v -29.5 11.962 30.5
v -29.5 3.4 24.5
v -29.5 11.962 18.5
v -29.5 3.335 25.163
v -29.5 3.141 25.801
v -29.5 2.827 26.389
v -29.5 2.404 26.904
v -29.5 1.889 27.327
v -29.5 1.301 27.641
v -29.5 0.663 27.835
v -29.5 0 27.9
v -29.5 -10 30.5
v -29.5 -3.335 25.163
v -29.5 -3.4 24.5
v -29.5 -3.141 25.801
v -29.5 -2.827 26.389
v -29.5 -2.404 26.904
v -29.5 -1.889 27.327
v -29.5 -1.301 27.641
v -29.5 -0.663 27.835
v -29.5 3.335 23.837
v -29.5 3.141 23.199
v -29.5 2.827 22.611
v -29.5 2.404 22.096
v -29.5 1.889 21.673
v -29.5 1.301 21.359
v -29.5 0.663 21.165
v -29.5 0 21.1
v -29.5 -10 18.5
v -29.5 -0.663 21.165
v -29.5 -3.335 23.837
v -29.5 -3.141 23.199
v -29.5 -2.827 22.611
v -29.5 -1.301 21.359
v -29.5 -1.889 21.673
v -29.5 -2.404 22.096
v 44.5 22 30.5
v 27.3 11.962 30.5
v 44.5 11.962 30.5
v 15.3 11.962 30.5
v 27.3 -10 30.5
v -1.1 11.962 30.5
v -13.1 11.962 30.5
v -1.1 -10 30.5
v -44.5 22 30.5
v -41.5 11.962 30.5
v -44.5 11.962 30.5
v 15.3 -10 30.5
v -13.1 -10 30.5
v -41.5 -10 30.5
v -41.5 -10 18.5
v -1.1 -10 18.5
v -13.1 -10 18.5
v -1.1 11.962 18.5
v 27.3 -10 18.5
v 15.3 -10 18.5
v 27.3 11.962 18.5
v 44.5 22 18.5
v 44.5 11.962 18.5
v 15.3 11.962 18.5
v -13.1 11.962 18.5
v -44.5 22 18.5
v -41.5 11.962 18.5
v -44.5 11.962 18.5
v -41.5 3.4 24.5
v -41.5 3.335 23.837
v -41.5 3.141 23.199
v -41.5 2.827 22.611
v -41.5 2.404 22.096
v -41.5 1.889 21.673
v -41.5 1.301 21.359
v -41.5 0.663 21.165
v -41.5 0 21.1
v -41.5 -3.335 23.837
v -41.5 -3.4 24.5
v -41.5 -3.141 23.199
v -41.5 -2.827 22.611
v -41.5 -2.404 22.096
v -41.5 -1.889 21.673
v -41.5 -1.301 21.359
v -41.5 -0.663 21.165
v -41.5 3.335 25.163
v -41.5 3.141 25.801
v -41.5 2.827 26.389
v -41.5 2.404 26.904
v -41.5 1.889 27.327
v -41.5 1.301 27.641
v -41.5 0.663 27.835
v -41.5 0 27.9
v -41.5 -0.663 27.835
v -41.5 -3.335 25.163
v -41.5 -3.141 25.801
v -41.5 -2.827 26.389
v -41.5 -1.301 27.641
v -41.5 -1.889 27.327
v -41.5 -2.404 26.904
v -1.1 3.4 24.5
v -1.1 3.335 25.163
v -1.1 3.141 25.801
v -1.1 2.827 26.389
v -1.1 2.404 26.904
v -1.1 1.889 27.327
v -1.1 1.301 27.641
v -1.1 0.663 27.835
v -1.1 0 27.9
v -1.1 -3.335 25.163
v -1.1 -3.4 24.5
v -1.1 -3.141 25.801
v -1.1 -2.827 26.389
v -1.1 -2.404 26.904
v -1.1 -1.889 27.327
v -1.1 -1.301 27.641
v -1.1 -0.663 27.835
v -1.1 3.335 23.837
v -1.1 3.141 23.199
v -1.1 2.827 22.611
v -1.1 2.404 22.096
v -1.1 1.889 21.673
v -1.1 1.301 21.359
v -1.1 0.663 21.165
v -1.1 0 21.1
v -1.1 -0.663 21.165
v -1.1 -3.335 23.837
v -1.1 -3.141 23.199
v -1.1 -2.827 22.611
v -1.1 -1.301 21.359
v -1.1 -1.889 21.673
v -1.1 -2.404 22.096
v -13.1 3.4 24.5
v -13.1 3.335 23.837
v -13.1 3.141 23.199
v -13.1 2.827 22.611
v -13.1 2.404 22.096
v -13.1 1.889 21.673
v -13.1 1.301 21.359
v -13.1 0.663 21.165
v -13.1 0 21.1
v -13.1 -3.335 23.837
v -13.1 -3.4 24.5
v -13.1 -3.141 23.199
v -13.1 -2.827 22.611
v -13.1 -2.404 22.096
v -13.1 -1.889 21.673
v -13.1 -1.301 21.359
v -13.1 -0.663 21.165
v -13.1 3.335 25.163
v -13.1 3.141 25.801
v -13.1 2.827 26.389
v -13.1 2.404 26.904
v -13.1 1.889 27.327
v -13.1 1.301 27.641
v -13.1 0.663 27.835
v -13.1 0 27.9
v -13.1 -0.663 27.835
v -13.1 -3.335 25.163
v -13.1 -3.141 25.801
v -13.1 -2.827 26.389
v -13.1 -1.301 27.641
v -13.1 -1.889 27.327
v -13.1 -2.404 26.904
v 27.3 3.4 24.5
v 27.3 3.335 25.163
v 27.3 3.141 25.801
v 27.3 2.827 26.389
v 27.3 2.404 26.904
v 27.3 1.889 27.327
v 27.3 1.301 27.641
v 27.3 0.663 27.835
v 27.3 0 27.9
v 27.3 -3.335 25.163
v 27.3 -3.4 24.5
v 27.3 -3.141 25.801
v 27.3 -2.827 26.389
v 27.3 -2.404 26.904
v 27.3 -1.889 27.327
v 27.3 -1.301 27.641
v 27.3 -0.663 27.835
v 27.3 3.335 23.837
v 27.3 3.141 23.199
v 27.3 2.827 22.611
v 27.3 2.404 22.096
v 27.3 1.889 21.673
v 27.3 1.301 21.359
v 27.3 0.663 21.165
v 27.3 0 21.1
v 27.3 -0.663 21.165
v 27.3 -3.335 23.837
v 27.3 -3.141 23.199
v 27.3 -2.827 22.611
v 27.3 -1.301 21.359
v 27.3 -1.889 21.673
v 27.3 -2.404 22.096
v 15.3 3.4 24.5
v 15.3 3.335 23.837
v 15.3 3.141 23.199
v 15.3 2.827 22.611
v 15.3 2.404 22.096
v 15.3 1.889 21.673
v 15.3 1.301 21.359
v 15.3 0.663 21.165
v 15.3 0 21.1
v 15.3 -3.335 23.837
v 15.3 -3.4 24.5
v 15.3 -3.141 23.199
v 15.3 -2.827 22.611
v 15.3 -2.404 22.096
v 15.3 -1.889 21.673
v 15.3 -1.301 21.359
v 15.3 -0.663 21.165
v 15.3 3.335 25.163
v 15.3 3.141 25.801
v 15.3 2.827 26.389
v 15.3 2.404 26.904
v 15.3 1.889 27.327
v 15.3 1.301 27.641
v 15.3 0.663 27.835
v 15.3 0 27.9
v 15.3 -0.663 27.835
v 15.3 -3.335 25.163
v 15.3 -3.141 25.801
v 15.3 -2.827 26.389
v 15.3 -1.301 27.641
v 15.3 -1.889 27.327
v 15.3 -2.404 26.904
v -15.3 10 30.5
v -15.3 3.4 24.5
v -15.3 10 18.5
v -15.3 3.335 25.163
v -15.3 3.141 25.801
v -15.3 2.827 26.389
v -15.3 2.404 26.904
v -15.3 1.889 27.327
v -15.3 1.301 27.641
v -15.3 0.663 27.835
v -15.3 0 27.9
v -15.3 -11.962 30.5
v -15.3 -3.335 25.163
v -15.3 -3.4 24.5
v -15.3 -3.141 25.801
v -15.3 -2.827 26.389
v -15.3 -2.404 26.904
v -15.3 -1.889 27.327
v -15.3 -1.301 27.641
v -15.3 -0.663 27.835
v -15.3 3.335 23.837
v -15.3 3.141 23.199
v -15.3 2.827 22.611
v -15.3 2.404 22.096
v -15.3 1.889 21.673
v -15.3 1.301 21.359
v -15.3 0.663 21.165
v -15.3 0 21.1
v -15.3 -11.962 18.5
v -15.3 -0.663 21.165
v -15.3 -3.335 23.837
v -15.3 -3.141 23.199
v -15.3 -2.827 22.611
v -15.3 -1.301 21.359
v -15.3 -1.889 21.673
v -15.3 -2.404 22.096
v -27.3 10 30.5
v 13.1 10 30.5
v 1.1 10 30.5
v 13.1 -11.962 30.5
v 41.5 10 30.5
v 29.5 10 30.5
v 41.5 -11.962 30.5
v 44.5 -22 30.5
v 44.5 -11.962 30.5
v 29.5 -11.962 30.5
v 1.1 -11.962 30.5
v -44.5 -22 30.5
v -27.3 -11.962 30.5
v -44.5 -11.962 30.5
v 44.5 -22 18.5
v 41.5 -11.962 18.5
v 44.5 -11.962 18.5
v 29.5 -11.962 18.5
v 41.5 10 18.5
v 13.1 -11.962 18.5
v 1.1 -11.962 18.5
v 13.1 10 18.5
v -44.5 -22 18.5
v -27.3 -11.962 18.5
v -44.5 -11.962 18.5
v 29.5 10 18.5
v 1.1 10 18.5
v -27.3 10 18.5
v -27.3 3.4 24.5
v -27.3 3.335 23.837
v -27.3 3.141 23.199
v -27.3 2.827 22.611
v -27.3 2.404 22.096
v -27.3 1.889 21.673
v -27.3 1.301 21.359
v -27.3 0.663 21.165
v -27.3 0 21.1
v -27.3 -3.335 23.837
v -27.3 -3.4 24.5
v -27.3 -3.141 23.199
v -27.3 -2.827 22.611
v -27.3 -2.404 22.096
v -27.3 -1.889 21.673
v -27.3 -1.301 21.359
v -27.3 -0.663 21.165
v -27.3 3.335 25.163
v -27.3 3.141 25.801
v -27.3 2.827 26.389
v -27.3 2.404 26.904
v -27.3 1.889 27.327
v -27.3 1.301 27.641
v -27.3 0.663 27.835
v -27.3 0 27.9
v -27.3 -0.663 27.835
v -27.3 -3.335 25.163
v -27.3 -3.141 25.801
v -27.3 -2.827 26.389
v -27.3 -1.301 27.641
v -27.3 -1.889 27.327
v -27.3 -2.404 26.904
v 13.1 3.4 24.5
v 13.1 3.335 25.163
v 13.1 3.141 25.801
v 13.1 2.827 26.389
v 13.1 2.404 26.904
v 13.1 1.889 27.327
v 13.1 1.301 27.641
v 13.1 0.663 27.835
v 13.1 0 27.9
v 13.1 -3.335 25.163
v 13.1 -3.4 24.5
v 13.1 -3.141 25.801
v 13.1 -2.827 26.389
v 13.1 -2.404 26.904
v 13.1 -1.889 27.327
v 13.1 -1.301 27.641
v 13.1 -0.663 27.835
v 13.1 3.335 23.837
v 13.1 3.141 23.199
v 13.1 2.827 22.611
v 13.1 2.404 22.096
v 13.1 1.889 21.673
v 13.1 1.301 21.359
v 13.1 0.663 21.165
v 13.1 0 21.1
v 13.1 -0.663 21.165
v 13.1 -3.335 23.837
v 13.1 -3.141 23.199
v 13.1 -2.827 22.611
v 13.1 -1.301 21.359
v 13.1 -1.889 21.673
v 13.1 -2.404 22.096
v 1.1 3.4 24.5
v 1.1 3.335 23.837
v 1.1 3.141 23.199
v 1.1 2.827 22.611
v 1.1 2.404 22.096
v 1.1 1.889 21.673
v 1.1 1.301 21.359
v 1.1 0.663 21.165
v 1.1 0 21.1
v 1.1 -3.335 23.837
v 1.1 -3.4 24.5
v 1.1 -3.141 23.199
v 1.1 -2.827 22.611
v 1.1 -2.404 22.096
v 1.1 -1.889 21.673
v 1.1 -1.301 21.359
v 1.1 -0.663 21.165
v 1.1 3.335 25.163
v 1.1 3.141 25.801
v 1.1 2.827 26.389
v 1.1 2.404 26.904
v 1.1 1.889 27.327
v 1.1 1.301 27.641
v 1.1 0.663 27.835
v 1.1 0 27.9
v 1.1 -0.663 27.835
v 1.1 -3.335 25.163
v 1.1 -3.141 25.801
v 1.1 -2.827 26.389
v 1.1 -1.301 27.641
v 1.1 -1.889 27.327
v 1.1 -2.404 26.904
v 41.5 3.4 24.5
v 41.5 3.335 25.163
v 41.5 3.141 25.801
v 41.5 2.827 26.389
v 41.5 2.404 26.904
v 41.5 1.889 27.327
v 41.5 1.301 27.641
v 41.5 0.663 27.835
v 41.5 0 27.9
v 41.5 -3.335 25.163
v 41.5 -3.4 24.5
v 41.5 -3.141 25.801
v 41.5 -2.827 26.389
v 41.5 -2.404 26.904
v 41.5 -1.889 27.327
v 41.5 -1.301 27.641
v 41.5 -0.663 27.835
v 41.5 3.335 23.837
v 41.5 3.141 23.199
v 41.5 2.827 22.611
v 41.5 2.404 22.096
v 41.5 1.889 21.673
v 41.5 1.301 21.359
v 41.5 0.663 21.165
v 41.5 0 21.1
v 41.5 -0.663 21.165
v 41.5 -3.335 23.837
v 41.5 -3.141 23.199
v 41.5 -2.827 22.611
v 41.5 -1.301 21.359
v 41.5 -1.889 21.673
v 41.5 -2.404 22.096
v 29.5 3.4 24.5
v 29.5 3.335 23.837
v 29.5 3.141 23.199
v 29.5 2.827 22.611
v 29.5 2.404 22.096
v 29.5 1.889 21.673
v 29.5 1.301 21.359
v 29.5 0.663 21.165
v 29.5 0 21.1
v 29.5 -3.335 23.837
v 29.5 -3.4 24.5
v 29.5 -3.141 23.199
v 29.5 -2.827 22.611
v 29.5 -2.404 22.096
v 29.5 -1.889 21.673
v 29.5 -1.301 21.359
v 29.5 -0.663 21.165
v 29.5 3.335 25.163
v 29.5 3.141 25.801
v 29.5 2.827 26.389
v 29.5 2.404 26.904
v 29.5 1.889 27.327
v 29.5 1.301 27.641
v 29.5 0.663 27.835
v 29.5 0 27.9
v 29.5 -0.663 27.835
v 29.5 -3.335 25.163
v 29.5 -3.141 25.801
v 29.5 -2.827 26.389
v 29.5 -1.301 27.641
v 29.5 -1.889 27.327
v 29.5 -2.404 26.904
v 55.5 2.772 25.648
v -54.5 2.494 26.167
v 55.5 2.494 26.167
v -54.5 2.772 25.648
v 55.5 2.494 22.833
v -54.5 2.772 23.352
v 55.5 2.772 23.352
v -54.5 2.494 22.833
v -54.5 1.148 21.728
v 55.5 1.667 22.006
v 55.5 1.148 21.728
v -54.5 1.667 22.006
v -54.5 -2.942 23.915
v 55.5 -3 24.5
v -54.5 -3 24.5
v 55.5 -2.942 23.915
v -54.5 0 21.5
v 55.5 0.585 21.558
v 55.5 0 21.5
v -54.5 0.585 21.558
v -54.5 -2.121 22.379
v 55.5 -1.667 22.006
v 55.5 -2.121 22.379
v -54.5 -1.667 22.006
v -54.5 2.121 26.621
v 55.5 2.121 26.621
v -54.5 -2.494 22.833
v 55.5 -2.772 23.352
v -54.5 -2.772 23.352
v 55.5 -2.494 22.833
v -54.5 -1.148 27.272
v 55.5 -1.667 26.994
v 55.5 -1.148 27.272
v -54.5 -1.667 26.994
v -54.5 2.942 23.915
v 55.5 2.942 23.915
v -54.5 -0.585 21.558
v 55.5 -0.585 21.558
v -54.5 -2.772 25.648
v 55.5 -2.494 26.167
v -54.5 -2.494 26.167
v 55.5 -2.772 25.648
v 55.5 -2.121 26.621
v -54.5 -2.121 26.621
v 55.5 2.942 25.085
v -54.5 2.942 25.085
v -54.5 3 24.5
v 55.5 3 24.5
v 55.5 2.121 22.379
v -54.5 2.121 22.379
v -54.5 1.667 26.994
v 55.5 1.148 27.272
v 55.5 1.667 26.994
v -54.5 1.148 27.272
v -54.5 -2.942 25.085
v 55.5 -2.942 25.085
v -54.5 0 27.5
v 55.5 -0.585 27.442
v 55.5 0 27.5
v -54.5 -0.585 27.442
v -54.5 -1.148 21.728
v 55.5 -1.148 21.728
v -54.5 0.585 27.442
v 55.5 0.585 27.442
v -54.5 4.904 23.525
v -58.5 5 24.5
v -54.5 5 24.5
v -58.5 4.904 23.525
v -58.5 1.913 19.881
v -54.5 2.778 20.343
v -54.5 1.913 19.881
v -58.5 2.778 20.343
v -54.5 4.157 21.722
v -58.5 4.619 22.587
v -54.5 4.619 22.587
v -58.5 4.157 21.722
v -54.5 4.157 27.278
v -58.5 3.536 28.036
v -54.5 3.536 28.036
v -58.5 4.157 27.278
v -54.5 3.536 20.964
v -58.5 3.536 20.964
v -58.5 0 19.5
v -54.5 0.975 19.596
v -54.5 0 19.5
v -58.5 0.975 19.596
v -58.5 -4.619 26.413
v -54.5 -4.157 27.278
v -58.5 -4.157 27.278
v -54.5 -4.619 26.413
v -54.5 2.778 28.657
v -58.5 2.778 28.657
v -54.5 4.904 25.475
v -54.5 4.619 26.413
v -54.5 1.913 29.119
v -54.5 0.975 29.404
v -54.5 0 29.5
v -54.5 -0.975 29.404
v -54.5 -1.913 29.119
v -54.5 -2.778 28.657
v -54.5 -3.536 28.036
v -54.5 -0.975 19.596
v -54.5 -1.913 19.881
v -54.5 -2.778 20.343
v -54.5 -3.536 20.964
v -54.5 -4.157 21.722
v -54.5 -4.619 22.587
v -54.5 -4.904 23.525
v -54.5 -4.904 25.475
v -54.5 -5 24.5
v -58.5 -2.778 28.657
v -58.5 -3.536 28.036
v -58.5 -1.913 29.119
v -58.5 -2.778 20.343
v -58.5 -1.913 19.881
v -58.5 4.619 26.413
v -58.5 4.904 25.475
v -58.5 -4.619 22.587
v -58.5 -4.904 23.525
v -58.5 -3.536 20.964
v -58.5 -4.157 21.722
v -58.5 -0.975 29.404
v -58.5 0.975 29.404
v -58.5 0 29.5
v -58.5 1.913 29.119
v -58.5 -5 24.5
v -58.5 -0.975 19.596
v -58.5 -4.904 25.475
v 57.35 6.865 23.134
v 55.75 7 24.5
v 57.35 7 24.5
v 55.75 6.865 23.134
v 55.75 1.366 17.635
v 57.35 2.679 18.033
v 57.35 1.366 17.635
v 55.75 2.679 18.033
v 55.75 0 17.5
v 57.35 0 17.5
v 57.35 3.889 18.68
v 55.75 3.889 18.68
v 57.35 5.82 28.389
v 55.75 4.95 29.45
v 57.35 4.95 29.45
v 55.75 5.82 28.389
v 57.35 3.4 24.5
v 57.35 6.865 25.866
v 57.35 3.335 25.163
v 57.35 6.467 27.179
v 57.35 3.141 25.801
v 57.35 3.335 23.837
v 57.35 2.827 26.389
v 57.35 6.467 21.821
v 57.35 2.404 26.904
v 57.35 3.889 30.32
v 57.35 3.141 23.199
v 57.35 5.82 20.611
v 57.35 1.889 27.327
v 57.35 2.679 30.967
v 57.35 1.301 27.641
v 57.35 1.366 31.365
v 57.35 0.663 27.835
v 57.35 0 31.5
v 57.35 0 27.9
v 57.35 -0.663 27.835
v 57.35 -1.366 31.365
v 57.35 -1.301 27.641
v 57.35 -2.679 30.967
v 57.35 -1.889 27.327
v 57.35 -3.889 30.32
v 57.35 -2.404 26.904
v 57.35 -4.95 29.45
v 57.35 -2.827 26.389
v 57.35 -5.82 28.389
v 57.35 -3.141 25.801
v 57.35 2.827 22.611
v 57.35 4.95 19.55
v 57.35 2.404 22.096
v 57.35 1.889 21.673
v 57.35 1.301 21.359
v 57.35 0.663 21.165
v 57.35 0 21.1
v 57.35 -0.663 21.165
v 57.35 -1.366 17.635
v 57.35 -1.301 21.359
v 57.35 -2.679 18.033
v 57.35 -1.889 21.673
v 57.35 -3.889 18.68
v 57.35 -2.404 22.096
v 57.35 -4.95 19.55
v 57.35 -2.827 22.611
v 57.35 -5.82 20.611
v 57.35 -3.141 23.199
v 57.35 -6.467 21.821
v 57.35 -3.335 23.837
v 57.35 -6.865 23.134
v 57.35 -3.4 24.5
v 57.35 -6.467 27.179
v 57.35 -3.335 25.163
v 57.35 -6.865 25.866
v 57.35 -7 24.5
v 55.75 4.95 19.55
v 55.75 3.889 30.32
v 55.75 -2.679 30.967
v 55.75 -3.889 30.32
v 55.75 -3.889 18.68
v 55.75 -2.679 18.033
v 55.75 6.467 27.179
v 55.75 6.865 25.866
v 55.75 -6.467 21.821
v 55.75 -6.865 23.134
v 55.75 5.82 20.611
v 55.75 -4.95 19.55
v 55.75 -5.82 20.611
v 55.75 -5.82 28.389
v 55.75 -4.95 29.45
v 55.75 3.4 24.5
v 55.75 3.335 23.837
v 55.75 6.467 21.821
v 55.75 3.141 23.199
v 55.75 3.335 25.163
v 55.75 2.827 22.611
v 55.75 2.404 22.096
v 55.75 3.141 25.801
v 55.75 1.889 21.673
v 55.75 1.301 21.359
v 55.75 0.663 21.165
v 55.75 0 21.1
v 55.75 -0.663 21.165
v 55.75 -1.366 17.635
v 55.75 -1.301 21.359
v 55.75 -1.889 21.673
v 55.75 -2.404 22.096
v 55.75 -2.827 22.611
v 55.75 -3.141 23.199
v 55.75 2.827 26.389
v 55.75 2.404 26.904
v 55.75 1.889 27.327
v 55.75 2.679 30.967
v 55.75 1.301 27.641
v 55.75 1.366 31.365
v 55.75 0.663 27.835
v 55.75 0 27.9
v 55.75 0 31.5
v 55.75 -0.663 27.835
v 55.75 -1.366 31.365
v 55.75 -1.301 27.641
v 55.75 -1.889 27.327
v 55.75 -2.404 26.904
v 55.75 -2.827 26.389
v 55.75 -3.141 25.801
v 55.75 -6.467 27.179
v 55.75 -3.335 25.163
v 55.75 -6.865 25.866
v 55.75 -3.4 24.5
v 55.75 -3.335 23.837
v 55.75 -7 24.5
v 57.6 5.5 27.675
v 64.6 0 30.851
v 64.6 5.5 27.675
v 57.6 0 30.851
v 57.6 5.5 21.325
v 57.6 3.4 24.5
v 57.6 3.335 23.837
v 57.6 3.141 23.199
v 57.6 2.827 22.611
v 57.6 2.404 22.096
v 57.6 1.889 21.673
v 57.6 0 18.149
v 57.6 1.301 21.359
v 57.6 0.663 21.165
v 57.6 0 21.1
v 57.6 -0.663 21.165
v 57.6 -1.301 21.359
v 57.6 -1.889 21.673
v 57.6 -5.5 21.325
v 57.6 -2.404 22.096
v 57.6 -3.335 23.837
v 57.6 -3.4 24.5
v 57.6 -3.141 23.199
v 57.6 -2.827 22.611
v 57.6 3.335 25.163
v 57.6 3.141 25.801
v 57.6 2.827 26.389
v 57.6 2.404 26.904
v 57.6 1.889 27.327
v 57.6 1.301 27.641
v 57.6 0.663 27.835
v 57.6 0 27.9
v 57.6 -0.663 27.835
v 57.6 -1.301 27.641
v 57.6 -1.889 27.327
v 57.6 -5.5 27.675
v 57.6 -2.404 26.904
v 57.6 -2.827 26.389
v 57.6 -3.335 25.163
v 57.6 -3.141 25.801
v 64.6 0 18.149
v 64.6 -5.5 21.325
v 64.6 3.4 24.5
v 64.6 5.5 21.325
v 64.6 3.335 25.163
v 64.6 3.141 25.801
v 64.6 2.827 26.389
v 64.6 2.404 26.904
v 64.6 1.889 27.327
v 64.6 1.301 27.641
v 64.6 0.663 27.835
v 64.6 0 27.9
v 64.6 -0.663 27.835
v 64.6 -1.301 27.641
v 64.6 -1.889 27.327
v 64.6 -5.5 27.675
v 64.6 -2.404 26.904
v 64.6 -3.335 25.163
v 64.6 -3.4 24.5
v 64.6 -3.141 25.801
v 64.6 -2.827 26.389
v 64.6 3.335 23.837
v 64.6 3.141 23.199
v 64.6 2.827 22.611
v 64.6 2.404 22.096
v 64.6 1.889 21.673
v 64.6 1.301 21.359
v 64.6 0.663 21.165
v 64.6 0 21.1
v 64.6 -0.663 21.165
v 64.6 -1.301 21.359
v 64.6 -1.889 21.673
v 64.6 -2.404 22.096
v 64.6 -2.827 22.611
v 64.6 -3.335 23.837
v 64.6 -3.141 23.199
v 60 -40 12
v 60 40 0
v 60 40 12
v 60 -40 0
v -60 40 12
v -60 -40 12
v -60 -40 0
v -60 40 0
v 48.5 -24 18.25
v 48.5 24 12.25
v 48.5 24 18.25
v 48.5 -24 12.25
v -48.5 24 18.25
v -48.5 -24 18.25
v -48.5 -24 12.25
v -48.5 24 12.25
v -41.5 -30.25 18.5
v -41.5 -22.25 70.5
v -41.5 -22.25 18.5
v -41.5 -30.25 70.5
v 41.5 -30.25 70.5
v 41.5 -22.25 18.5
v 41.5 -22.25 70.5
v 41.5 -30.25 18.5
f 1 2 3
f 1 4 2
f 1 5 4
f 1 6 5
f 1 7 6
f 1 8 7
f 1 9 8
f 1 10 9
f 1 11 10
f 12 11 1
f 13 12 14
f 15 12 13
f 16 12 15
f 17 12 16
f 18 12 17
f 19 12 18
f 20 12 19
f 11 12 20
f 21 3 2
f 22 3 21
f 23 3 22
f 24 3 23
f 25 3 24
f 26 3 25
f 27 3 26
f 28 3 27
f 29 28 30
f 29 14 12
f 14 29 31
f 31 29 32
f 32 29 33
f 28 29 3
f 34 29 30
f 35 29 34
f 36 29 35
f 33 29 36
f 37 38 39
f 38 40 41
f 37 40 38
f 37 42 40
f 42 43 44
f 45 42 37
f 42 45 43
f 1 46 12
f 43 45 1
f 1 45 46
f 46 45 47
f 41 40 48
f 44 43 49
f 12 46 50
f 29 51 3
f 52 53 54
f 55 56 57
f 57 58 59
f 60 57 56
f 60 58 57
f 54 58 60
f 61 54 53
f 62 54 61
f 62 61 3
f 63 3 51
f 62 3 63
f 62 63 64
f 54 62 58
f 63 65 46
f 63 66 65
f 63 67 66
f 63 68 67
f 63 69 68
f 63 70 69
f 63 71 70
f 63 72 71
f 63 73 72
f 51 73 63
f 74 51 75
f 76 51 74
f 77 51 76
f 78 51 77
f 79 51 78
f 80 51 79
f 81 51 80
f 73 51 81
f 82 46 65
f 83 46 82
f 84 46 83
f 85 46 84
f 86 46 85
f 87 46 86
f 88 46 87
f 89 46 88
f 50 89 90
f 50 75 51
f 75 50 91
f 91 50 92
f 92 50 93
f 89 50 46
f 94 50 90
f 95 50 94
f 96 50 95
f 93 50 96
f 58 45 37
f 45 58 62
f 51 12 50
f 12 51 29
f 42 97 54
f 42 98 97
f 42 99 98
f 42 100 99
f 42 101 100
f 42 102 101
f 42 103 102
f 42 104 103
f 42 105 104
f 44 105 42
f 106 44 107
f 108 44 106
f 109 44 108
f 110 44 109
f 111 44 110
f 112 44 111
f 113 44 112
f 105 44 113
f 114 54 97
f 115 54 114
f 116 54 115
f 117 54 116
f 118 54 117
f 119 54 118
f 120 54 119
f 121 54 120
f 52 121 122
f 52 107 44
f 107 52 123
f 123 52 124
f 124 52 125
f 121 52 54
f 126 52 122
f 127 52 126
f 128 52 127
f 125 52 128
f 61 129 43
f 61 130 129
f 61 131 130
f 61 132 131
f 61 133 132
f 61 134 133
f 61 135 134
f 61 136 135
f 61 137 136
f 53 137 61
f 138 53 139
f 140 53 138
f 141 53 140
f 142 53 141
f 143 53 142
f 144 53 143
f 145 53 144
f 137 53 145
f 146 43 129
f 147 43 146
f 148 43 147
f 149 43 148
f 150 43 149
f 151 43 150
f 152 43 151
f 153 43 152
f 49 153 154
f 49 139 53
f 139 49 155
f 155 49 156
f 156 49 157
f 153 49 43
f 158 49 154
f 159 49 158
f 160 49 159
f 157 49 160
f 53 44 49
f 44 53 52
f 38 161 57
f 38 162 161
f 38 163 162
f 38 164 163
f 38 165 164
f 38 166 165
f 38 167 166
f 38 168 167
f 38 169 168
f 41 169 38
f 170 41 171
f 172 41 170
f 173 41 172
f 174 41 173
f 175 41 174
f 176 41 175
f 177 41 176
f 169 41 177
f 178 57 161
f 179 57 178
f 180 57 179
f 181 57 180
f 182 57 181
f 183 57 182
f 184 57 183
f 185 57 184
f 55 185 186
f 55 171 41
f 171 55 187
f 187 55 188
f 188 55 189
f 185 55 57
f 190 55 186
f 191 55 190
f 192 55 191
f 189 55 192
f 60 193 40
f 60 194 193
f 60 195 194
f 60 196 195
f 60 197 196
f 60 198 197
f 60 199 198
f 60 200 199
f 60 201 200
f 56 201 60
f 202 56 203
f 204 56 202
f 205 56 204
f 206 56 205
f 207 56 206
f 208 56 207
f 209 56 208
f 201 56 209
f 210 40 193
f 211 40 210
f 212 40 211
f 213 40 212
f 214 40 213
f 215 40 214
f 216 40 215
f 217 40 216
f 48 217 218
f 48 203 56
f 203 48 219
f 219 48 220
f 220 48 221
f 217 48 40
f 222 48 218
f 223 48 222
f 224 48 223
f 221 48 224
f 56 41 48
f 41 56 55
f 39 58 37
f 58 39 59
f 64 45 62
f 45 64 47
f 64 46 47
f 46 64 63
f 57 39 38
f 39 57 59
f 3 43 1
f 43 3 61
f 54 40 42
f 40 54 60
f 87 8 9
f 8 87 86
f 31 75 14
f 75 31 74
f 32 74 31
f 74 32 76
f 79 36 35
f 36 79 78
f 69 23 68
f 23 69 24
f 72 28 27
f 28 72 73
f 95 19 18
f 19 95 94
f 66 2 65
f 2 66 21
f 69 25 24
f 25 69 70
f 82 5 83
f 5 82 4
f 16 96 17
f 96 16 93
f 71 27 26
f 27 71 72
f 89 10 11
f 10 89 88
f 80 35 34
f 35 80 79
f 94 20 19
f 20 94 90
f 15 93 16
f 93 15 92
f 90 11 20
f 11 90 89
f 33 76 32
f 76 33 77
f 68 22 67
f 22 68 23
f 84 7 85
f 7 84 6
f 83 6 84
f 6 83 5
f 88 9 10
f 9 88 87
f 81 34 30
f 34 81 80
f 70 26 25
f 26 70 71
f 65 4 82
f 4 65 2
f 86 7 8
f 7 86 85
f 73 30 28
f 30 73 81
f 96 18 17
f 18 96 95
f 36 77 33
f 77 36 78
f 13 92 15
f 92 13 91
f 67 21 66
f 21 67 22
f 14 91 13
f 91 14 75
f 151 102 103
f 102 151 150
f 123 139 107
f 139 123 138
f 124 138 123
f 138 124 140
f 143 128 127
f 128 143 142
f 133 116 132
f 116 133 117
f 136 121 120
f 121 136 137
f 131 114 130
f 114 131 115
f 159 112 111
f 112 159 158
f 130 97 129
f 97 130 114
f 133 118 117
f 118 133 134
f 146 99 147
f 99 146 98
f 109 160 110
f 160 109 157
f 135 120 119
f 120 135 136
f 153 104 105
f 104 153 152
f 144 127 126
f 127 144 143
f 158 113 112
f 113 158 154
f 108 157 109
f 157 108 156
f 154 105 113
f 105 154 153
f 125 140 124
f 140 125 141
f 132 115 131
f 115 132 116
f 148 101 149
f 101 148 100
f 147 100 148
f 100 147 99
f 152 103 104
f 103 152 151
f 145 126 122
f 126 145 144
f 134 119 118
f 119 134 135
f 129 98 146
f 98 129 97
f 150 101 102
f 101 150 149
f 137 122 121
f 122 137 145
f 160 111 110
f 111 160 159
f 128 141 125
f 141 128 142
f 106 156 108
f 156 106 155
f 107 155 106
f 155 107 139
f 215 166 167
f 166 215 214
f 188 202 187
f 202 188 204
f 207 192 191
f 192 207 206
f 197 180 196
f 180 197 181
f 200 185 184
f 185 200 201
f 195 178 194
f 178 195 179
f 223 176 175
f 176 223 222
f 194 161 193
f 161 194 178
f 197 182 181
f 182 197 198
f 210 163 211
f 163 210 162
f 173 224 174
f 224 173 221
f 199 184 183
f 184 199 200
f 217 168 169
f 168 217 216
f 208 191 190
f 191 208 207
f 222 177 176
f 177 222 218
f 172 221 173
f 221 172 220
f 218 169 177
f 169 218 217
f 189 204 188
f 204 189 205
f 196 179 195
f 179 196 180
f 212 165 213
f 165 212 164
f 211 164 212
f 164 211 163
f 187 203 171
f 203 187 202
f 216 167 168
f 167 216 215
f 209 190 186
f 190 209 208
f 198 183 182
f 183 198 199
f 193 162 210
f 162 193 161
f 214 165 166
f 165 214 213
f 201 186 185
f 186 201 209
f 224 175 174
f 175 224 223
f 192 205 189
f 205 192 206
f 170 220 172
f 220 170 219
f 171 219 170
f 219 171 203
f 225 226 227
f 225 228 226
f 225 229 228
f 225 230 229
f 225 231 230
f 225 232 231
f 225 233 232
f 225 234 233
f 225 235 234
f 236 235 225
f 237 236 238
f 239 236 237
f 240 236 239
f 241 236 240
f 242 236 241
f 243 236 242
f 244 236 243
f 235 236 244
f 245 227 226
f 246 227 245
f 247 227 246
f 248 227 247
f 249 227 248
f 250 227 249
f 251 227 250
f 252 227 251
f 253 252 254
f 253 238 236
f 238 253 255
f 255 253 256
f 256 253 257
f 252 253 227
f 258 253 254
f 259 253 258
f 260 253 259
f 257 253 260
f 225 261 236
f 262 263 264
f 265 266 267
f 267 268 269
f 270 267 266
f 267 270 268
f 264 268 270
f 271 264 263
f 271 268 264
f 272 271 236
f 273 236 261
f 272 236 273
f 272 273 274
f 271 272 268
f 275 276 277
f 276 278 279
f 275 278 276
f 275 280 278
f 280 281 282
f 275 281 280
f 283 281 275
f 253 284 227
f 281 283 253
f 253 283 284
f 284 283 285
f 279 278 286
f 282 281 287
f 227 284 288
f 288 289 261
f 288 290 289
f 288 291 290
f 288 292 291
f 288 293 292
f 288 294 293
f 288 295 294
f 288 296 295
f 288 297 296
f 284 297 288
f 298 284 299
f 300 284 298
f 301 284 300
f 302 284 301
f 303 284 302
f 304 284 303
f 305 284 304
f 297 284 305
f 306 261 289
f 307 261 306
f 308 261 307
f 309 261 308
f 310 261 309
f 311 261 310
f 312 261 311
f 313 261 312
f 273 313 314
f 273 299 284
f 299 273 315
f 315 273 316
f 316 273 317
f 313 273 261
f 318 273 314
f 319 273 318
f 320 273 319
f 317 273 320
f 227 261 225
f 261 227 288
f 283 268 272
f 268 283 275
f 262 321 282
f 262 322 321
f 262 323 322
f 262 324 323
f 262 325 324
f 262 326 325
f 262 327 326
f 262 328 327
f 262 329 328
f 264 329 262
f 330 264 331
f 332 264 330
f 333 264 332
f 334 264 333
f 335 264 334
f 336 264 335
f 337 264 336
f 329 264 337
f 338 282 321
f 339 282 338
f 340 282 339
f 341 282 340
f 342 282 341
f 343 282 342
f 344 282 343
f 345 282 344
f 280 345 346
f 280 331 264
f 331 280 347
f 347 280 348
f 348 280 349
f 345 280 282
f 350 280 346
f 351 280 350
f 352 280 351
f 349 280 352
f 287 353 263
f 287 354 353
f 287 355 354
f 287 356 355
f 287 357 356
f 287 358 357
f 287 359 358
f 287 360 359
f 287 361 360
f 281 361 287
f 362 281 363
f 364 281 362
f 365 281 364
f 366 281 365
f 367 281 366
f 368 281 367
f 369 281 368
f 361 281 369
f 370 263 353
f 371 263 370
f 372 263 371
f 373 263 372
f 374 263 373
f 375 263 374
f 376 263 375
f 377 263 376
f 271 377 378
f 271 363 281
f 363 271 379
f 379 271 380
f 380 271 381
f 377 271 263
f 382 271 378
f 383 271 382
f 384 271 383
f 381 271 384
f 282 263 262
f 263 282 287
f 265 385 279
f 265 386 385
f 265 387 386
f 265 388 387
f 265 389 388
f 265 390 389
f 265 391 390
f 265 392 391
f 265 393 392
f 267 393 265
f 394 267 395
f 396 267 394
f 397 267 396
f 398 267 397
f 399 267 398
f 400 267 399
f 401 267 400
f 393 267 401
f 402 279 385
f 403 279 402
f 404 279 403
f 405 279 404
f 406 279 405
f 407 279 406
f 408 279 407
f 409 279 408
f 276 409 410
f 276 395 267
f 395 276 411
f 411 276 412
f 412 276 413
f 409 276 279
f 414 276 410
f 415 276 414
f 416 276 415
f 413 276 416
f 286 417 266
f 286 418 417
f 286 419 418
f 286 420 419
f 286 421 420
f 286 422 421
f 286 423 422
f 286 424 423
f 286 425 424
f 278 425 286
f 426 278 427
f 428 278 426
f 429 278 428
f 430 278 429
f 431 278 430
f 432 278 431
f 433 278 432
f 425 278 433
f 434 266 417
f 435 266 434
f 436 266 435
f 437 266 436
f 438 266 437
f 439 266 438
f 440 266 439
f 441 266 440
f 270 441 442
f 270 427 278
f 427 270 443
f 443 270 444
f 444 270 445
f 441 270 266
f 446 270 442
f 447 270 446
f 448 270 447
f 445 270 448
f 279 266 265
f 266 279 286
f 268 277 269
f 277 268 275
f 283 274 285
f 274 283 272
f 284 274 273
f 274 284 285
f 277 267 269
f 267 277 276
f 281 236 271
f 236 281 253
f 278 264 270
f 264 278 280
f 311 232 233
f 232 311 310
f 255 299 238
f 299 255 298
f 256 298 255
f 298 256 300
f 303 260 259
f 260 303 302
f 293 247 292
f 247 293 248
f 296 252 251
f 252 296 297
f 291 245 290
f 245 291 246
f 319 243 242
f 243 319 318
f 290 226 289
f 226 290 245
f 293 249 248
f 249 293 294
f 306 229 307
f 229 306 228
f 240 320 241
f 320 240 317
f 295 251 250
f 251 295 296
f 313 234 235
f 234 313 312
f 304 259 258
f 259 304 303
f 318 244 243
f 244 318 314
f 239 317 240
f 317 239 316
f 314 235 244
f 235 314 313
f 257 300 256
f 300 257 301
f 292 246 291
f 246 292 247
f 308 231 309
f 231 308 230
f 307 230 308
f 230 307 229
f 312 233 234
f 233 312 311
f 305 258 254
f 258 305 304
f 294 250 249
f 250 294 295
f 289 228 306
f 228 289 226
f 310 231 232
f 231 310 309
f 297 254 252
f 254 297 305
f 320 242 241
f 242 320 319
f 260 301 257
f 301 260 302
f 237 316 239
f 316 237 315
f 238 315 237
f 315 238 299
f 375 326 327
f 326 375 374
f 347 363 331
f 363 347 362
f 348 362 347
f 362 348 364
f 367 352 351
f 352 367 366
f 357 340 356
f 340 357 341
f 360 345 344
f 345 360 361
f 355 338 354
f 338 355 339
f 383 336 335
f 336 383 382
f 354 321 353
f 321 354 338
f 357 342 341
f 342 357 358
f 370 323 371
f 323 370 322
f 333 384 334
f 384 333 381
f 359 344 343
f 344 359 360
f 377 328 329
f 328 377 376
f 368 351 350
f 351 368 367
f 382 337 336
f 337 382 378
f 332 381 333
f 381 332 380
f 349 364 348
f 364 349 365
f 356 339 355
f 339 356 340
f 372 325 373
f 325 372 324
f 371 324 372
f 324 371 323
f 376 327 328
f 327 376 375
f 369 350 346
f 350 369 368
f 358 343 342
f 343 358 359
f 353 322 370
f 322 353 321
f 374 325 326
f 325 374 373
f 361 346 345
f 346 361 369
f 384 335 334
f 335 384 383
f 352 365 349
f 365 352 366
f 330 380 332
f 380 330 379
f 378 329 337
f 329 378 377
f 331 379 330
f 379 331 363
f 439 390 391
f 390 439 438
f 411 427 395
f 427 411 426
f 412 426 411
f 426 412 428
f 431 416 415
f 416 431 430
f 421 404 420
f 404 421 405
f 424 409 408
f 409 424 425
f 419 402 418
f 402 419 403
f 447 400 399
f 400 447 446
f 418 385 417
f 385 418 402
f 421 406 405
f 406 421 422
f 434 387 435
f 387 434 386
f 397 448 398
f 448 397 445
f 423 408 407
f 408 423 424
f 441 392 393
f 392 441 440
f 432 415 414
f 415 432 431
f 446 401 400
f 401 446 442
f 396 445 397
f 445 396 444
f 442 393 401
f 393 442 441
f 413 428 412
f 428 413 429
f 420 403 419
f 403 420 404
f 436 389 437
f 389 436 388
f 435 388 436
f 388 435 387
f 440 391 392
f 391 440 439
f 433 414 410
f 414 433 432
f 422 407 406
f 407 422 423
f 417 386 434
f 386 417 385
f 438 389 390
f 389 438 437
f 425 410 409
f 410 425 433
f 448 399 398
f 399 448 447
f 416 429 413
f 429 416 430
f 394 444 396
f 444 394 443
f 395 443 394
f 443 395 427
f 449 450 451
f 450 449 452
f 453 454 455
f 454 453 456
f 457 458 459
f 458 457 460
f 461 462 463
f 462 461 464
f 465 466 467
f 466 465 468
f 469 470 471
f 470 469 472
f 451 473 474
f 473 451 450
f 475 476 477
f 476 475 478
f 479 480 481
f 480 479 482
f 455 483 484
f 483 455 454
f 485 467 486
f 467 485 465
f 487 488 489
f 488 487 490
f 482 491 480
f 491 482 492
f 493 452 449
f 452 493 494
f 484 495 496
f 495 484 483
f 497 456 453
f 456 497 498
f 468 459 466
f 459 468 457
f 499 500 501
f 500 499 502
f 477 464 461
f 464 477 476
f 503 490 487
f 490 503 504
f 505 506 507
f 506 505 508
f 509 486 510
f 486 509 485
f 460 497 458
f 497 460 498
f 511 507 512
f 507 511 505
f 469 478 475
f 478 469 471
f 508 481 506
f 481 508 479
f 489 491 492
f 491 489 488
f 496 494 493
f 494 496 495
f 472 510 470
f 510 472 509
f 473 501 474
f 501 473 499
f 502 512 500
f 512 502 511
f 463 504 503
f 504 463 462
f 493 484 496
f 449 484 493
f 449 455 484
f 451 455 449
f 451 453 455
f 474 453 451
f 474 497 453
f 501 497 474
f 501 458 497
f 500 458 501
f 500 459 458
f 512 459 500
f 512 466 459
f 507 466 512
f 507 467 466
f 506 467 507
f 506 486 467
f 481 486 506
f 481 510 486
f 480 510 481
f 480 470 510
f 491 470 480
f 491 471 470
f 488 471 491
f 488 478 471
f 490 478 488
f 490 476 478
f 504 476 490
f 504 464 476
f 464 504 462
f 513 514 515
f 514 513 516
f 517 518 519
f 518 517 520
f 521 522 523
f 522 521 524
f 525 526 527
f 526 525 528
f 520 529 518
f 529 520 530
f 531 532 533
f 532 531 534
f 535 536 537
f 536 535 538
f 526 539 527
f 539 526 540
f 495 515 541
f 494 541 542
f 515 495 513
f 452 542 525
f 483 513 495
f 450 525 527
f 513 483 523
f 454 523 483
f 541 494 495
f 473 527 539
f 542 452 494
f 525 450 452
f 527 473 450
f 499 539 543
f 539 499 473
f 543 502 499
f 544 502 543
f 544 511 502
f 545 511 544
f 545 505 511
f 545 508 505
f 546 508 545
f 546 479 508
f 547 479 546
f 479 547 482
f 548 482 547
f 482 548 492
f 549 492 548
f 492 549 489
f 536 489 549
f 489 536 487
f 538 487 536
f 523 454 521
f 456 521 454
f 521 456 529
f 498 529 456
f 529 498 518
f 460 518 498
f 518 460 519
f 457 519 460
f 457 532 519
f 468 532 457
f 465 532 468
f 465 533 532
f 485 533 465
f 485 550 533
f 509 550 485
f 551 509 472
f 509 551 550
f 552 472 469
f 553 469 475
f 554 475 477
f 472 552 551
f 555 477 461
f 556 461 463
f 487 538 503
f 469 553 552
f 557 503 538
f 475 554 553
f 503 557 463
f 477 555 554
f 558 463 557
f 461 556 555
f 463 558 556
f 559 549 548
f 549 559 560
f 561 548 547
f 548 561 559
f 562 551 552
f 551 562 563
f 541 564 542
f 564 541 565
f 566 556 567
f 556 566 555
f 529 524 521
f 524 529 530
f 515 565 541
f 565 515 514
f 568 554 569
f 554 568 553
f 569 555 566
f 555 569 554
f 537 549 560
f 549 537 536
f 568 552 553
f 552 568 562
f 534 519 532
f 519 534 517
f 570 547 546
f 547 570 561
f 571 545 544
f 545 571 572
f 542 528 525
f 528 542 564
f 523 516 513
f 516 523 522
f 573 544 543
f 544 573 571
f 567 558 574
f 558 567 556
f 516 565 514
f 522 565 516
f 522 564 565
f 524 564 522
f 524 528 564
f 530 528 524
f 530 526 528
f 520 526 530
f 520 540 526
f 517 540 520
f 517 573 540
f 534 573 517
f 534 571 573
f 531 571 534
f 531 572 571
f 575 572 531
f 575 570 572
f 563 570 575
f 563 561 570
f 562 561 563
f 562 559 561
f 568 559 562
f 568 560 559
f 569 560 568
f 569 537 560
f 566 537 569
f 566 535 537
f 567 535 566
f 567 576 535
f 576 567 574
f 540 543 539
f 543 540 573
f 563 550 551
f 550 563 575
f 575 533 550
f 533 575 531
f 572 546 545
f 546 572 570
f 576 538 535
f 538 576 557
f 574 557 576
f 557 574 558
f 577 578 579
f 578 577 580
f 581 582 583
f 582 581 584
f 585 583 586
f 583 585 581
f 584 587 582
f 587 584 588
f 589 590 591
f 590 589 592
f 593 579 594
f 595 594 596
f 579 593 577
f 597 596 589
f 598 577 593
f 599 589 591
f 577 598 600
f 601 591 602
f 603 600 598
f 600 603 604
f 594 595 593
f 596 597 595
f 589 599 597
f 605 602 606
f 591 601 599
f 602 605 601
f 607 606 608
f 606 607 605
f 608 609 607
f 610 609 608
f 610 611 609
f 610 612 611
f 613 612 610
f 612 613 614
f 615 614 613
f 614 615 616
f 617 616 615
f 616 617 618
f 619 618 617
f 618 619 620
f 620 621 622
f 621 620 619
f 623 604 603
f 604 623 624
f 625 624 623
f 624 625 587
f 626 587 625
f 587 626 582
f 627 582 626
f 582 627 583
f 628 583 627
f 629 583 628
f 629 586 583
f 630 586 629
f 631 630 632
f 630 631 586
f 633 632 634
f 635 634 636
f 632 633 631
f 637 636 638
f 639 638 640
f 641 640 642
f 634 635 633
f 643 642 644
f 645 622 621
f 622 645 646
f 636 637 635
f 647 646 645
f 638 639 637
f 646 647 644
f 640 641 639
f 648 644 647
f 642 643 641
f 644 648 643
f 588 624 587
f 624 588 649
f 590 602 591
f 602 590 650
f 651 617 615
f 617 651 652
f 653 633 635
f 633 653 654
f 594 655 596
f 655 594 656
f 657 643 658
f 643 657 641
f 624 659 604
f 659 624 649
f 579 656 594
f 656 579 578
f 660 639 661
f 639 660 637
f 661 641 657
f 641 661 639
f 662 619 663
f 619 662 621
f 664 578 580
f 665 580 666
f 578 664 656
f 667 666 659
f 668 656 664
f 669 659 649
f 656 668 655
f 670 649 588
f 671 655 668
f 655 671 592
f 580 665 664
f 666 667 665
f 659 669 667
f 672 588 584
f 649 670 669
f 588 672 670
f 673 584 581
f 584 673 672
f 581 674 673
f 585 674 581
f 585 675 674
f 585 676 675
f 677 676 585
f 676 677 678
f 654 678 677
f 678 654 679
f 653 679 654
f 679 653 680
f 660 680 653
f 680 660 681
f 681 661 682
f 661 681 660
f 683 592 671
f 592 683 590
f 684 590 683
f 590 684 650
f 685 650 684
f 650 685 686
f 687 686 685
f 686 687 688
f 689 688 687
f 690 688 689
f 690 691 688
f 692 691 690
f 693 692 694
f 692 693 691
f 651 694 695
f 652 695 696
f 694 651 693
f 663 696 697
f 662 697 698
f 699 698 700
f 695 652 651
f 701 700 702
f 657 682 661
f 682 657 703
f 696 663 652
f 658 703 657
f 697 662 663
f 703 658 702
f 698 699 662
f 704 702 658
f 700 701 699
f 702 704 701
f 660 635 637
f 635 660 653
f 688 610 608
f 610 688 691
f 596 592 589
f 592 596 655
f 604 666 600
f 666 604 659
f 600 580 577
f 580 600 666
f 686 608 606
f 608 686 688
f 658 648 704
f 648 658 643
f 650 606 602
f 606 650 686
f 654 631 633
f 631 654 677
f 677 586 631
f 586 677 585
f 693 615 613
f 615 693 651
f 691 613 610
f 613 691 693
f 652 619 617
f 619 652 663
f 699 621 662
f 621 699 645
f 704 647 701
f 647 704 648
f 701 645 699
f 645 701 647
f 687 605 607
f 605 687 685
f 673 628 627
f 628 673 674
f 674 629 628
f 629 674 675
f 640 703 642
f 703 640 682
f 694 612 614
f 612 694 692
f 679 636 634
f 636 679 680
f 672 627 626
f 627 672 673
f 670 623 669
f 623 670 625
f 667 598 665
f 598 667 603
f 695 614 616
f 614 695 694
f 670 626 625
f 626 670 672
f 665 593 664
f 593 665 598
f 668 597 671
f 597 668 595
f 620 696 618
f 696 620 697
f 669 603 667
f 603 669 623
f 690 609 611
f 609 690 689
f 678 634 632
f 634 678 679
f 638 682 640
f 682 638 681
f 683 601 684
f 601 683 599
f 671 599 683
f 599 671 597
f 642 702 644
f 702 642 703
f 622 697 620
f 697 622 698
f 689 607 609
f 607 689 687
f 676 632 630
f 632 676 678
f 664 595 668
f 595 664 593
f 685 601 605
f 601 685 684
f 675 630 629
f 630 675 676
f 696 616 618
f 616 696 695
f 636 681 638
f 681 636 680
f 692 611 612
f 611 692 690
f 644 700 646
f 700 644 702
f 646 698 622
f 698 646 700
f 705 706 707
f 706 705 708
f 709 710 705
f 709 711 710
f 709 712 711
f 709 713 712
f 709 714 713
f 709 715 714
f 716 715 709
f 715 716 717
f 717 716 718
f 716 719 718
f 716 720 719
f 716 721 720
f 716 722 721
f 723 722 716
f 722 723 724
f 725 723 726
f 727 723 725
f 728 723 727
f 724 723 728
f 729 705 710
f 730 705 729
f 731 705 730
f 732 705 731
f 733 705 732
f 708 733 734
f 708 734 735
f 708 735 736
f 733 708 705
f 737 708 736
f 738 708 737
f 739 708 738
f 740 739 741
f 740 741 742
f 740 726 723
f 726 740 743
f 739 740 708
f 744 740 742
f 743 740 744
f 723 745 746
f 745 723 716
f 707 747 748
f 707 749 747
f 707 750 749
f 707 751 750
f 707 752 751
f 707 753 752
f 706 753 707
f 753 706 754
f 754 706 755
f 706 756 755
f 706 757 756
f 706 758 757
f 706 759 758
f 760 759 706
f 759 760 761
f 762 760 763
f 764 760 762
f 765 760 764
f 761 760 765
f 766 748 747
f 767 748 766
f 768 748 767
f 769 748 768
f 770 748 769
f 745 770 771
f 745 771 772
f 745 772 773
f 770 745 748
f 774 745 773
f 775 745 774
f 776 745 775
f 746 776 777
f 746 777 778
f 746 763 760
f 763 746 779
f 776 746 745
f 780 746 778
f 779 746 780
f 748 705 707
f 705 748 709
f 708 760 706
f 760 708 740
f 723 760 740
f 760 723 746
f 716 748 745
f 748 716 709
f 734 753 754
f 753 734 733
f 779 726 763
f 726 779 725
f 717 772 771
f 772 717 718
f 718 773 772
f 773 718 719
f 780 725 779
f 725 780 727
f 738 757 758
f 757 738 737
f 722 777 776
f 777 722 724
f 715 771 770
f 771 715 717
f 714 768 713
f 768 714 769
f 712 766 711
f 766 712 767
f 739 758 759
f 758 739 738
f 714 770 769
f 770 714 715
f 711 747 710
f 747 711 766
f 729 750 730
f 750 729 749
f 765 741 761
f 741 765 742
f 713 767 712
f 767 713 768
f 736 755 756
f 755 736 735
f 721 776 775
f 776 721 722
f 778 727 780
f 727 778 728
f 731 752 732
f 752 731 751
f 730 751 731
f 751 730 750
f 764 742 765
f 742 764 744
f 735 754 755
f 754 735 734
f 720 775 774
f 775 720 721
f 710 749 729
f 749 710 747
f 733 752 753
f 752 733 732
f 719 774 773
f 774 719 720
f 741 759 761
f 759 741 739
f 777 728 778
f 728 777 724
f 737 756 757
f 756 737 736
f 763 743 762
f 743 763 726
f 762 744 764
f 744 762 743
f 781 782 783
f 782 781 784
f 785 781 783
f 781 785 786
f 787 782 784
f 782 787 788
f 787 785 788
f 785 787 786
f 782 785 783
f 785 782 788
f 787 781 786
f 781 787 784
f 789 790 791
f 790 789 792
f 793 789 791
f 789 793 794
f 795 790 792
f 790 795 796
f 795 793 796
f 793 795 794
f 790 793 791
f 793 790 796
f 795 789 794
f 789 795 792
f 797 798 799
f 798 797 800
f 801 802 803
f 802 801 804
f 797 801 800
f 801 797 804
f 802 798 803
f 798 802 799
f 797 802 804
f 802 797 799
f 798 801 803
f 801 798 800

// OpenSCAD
$fn = 32;

// ------------------------------------------------------------------------
// Comb hinge with flap: leaf 89 x 22 mm, pin d6, flap 52 mm
// Every part is its own module, assembly() places every instance.
// ------------------------------------------------------------------------

// --- part 1 ---
module hinge_bed() {
  difference() {
    translate([-60, -40, 0]) cube([120, 80, 12]);
  }
}

// --- part 2 ---
module hinge_riser() {
  difference() {
    translate([-48.5, -24, 0]) cube([97, 48, 6]);
  }
}

// --- part 3 ---
module hinge_leaf_a() {
  difference() {
    union() {
      translate([-41.5, -10, -6]) cube([12, 32, 12]);
      translate([-13.1, -10, -6]) cube([12, 32, 12]);
      translate([15.3, -10, -6]) cube([12, 32, 12]);
      translate([-44.5, 11.962, -6]) cube([89, 10.038, 12]);
    }
    translate([-35.5, 0, 0]) rotate([0, 90, 0]) cylinder(h = 14, d = 6.8, center = true);
    translate([-7.1, 0, 0]) rotate([0, 90, 0]) cylinder(h = 14, d = 6.8, center = true);
    translate([21.3, 0, 0]) rotate([0, 90, 0]) cylinder(h = 14, d = 6.8, center = true);
  }
}

// --- part 4 ---
module hinge_leaf_b() {
  difference() {
    union() {
      translate([-27.3, -22, -6]) cube([12, 32, 12]);
      translate([1.1, -22, -6]) cube([12, 32, 12]);
      translate([29.5, -22, -6]) cube([12, 32, 12]);
      translate([-44.5, -22, -6]) cube([89, 10.038, 12]);
    }
    translate([-21.3, 0, 0]) rotate([0, 90, 0]) cylinder(h = 14, d = 6.8, center = true);
    translate([7.1, 0, 0]) rotate([0, 90, 0]) cylinder(h = 14, d = 6.8, center = true);
    translate([35.5, 0, 0]) rotate([0, 90, 0]) cylinder(h = 14, d = 6.8, center = true);
  }
}

// --- part 5 ---
module hinge_flap() {
  difference() {
    translate([-41.5, -26, 0]) cube([83, 52, 8]);
  }
}

// --- part 6 ---
module hinge_pin() {
  rotate([0, 90, 0]) cylinder(h = 111, d = 6, center = true);
  translate([-58.5, 0, 0]) rotate([0, 90, 0]) cylinder(h = 4, d = 10);
}

// --- part 7 ---
module pin_washer() {
  difference() {
      translate([0, 0, 0]) cylinder(h = 1.6, d = 14);
      translate([0, 0, -1]) cylinder(h = 3.6, d = 6.8);
    }
}

// --- part 8 ---
module pin_nut() {
  difference() {
    linear_extrude(height = 7) polygon(points = [[6.351, 0], [3.175, 5.5], [-3.175, 5.5], [-6.351, 0], [-3.175, -5.5], [3.175, -5.5]]);
    translate([0, 0, -1]) cylinder(h = 9, d = 6.8);
  }
}

// --- assembly ---
module assembly() {
  color([0.80, 0.24, 0.20]) translate([0, 0, 0]) rotate([0, 0, 0]) hinge_bed();
  color([0.20, 0.45, 0.75]) translate([0, 0, 12.25]) rotate([0, 0, 0]) hinge_riser();
  color([0.25, 0.62, 0.32]) translate([0, 0, 24.5]) rotate([0, 0, 0]) hinge_leaf_a();
  color([0.92, 0.70, 0.18]) translate([0, 0, 24.5]) rotate([0, 0, 0]) hinge_leaf_b();
  color([0.58, 0.35, 0.70]) translate([0, -22.25, 44.5]) rotate([90, 0, 0]) hinge_flap();
  color([0.16, 0.66, 0.66]) translate([0, 0, 24.5]) rotate([0, 0, 0]) hinge_pin();
  color([0.85, 0.48, 0.18]) translate([55.75, 0, 24.5]) rotate([0, 90, 0]) pin_washer();
  color([0.55, 0.60, 0.65]) translate([57.6, 0, 24.5]) rotate([0, 90, 0]) pin_nut();
}

assembly();
